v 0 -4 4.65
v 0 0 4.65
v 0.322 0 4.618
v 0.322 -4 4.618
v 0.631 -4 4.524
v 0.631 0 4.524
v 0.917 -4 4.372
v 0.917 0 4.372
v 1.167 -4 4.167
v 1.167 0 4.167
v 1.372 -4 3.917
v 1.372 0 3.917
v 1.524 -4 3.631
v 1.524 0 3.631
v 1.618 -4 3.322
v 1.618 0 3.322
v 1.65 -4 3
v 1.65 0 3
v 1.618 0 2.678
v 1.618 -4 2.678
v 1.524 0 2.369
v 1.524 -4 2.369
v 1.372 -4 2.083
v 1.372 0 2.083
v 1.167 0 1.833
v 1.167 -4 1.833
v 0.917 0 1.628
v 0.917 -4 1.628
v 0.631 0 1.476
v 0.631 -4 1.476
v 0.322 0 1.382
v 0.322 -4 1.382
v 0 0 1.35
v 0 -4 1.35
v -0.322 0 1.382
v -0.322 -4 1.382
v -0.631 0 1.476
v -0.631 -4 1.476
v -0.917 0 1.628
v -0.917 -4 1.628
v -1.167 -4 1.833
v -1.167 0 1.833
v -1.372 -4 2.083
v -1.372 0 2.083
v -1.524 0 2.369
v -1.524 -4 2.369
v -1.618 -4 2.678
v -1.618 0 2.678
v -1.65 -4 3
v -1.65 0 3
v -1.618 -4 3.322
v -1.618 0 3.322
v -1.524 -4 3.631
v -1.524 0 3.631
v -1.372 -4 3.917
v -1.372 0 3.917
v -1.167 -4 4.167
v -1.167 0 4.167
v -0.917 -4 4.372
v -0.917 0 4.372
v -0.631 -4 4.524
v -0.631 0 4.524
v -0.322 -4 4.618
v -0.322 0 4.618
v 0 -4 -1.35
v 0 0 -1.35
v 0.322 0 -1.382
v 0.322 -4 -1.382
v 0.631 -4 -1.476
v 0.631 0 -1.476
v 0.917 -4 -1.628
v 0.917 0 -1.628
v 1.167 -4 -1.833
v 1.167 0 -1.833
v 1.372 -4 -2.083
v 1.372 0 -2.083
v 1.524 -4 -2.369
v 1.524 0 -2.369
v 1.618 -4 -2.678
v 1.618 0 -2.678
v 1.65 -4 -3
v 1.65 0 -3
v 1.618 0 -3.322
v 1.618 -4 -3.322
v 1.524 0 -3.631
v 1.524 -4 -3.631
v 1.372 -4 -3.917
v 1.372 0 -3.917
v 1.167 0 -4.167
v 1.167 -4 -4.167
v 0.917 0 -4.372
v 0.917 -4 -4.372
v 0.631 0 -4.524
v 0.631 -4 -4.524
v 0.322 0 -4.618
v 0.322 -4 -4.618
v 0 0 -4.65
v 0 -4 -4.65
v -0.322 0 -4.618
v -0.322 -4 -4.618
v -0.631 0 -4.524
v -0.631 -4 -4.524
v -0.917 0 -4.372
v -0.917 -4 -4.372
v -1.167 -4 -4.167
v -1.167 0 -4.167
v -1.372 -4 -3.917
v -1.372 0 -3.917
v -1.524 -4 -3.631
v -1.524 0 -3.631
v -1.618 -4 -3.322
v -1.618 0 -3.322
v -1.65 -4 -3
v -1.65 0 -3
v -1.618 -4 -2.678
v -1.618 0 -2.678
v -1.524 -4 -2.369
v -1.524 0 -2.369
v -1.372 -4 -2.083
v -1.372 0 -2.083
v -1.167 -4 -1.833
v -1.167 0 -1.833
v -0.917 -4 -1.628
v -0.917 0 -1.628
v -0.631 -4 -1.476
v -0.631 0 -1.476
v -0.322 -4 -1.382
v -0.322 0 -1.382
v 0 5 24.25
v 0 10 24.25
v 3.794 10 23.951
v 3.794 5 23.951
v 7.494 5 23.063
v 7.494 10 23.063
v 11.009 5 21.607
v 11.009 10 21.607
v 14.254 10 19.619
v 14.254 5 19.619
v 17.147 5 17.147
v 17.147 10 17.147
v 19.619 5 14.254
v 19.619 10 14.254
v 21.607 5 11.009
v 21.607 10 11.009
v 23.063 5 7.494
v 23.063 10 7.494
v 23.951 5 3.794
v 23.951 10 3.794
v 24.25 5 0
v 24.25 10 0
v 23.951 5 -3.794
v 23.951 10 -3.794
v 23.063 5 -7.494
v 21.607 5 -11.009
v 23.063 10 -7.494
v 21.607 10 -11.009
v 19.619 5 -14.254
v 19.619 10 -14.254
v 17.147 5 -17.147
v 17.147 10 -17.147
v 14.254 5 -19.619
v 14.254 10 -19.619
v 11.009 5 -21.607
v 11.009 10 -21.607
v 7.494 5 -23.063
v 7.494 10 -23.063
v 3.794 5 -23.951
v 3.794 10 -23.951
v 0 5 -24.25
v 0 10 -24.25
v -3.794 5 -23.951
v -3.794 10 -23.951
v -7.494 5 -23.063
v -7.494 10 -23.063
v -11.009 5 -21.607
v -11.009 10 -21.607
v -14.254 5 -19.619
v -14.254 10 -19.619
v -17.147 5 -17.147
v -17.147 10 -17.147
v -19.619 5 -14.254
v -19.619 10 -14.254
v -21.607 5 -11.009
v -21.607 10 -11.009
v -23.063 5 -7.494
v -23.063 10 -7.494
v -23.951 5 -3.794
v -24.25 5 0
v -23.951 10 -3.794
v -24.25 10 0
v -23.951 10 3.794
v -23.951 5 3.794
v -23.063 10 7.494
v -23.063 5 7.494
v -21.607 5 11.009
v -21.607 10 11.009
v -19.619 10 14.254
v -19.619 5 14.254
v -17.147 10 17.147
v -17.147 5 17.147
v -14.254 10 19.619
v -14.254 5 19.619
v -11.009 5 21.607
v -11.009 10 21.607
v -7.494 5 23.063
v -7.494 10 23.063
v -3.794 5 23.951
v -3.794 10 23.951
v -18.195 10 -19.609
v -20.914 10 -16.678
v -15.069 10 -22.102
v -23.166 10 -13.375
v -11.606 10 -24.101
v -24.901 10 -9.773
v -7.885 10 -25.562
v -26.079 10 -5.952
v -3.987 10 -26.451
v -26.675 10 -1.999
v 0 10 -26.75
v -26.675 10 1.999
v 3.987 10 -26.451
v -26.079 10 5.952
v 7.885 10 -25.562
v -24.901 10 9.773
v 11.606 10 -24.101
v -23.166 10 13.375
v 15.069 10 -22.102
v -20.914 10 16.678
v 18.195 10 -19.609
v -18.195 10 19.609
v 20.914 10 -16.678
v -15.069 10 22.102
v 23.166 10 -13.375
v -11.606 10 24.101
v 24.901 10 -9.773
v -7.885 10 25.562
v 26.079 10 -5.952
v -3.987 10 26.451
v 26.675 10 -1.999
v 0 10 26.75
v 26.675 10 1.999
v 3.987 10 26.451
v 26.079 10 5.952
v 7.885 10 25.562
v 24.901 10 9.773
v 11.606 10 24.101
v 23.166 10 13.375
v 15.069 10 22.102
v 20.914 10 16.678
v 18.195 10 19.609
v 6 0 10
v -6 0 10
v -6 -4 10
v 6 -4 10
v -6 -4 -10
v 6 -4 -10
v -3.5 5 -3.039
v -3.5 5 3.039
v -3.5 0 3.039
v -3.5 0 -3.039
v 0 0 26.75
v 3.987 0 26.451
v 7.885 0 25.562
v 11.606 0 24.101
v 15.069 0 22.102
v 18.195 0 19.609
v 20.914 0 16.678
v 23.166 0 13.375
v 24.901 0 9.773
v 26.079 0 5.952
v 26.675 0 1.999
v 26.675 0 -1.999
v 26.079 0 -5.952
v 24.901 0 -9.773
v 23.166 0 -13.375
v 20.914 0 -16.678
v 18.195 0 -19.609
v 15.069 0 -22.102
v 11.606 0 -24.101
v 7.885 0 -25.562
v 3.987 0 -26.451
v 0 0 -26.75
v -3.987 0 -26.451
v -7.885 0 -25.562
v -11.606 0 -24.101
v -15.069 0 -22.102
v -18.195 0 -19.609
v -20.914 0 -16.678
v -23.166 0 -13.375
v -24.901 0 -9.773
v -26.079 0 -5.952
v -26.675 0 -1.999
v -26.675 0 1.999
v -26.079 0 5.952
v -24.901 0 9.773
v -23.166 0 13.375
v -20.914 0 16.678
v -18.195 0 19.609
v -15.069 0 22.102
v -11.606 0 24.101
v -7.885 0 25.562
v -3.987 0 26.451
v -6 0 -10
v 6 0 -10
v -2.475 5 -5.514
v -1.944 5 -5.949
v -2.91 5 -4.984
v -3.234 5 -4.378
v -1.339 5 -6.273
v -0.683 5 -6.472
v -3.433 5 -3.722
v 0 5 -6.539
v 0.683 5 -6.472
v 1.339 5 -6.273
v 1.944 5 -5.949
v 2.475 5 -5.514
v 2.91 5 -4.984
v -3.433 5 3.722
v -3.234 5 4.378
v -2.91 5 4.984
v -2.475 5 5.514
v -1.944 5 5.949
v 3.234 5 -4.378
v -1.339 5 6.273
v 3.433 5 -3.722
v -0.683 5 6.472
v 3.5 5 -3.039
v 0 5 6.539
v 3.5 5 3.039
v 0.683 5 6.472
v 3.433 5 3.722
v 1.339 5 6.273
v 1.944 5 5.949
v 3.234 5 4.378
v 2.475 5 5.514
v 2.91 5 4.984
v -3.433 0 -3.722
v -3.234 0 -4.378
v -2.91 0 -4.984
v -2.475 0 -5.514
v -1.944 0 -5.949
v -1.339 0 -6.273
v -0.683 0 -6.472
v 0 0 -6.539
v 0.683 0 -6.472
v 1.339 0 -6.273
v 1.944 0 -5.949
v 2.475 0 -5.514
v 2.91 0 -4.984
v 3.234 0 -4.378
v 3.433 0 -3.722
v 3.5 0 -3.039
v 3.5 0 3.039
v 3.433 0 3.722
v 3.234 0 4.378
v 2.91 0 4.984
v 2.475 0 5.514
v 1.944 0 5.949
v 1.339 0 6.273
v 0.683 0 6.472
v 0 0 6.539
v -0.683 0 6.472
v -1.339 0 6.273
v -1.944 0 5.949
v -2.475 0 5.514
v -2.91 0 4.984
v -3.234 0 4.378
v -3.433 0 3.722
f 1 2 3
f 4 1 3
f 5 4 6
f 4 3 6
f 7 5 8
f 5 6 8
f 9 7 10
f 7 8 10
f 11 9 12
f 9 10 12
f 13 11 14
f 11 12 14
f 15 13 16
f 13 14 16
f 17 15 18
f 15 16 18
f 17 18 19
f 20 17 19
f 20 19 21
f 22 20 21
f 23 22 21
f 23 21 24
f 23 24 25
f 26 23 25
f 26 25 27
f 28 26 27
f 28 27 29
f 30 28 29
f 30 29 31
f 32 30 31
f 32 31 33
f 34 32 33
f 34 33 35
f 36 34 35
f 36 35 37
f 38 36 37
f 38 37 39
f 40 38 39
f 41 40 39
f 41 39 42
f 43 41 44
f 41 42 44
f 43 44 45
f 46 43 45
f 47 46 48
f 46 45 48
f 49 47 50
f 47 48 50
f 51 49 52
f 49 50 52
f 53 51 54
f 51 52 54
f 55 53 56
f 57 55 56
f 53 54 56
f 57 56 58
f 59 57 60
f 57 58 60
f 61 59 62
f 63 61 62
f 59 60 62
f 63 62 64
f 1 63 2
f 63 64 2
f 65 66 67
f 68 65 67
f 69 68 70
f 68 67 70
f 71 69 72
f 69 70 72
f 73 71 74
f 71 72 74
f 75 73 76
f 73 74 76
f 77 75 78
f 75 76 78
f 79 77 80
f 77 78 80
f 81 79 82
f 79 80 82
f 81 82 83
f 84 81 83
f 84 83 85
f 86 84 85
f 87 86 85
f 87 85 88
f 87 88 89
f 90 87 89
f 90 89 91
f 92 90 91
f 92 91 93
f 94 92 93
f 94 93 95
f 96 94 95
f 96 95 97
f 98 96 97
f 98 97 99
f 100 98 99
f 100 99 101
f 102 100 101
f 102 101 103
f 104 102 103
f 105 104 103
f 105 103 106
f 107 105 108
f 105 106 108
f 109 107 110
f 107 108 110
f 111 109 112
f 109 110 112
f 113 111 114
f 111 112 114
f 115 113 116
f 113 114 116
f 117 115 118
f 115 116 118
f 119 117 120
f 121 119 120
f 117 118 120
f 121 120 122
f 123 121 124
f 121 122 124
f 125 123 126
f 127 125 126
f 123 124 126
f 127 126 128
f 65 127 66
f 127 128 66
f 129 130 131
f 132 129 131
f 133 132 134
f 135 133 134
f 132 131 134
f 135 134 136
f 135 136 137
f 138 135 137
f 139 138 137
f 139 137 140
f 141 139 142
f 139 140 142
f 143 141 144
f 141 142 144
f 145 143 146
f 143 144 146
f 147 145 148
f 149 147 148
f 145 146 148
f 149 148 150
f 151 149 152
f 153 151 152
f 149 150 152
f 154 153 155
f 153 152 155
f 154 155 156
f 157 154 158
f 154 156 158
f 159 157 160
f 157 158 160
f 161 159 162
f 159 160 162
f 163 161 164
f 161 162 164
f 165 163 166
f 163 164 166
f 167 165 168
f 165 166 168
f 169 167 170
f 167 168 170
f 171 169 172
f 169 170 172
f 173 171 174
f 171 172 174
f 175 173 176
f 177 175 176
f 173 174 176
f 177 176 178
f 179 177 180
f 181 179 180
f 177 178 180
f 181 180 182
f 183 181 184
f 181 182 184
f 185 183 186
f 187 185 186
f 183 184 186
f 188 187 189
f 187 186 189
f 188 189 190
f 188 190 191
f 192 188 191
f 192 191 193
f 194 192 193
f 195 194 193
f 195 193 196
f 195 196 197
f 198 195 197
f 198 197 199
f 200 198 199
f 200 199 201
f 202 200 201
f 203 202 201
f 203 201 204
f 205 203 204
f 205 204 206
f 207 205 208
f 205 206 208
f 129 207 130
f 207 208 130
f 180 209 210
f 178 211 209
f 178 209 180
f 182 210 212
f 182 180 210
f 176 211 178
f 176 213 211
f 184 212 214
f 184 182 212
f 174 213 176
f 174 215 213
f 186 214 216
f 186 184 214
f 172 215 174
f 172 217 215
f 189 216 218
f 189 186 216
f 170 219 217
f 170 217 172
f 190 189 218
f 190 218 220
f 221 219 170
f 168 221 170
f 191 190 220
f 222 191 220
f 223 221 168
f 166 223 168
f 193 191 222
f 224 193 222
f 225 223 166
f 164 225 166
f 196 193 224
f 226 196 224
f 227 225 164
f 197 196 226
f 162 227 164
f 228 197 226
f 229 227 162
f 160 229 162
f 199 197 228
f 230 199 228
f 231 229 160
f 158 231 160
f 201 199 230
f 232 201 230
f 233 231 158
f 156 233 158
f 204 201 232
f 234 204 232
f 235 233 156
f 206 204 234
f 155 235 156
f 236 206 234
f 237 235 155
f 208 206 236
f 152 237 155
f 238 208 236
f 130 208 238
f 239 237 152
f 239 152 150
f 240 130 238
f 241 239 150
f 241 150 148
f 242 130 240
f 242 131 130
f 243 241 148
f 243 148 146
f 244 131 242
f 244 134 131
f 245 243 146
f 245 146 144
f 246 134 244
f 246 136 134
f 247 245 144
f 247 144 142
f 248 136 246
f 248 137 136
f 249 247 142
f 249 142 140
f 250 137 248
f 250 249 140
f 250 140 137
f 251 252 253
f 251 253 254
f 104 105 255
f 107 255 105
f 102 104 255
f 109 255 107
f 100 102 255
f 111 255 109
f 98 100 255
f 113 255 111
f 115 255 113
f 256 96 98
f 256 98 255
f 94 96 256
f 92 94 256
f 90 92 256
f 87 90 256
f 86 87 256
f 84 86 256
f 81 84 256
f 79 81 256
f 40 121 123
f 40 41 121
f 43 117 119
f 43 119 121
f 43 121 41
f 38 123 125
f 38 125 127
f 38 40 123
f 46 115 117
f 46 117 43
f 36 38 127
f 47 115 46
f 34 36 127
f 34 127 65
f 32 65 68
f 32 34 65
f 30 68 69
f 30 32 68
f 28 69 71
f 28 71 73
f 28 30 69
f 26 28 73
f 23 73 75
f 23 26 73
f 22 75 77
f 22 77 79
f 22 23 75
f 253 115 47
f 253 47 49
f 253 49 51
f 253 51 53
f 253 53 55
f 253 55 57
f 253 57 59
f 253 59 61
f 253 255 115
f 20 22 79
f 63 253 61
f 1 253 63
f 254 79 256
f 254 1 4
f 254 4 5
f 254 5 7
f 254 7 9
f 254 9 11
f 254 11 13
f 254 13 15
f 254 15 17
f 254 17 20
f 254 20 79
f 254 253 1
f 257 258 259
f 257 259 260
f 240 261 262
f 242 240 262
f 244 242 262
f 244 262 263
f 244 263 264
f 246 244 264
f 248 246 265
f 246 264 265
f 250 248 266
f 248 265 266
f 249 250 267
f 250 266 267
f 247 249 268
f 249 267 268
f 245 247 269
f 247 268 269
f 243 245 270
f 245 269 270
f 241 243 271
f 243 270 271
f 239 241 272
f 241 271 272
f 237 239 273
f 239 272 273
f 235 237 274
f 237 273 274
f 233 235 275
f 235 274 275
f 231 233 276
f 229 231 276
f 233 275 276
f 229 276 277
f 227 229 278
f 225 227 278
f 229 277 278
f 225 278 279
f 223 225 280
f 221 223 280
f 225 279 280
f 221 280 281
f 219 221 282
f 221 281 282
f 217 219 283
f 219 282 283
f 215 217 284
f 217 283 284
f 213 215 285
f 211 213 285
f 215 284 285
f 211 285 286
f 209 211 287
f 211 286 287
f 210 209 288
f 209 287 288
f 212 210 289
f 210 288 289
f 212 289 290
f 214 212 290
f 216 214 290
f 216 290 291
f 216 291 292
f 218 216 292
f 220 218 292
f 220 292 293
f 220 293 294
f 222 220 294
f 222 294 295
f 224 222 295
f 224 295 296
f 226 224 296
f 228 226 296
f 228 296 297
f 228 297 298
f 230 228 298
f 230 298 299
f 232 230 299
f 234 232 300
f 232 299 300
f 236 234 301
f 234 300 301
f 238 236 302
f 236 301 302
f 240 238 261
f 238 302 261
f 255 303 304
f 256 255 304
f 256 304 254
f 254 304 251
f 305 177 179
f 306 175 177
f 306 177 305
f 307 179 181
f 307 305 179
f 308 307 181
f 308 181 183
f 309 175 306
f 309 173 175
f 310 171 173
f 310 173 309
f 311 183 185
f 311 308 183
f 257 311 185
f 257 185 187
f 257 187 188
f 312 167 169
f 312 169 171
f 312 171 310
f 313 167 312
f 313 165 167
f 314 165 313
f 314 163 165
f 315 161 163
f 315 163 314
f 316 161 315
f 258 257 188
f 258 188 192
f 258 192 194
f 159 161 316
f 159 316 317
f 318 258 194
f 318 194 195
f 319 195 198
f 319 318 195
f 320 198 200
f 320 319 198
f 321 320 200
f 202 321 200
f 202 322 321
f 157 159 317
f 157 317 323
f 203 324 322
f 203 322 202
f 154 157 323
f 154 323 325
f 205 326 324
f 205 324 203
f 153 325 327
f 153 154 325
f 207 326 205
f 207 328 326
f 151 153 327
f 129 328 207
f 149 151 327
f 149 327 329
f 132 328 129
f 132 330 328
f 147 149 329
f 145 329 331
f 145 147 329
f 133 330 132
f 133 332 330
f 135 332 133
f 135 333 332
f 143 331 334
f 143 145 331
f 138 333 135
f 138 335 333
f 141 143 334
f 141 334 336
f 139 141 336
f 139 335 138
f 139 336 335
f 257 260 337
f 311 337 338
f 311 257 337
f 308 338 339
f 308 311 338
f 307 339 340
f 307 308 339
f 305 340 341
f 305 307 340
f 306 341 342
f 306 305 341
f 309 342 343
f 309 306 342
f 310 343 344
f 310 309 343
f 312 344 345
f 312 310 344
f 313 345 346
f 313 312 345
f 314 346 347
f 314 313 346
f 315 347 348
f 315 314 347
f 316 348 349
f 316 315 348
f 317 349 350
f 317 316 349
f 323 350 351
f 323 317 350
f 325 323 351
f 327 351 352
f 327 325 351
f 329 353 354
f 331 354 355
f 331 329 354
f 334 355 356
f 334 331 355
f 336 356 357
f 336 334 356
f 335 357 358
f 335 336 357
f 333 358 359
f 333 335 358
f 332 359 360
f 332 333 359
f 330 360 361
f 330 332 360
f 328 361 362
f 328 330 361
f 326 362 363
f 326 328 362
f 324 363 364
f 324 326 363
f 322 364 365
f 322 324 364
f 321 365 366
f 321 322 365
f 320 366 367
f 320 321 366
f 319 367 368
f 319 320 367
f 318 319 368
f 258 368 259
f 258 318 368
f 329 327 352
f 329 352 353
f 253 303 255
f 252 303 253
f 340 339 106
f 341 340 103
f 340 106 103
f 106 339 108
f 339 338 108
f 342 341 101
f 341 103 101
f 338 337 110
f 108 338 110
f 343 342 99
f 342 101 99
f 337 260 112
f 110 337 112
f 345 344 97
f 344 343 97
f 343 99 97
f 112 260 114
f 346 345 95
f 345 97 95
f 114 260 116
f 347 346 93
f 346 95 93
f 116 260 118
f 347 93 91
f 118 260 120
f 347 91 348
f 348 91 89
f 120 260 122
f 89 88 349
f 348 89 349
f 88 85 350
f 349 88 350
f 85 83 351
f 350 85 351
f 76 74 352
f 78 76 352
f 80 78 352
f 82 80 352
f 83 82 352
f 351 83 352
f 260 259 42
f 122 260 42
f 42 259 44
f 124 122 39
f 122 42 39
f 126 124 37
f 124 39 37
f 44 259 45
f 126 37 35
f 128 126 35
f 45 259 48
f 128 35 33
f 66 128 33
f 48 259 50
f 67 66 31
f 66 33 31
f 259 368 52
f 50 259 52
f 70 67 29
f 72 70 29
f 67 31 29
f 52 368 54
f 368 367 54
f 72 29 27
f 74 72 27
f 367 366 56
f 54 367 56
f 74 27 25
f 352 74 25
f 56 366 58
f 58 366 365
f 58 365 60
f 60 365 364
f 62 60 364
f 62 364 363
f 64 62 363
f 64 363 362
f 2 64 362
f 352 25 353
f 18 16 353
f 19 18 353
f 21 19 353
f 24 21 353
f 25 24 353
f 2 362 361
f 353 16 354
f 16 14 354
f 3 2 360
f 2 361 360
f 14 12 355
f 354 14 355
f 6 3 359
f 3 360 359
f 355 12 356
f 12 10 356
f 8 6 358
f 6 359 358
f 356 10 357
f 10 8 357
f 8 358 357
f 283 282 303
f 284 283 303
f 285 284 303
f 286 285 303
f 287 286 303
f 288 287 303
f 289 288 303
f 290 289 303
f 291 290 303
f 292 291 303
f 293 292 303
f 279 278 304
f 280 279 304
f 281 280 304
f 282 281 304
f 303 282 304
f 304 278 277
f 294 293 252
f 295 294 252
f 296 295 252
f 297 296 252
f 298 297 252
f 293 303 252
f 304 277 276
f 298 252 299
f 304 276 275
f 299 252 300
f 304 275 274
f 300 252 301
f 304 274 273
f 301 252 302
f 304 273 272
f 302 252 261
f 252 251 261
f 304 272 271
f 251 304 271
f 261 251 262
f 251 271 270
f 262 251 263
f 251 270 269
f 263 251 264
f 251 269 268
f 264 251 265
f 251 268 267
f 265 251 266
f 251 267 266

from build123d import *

# Parameters (mm, degrees)
SKETCH1_R           = 26.75
BOSS_EXTRUDE1_DEPTH = 10
SKETCH2_R           = 24.25
CUT_EXTRUDE3_DEPTH  = 5
CUT_EXTRUDE5_DEPTH  = 6
SKETCH8_W           = 12
SKETCH8_H           = 20
BOSS_EXTRUDE2_DEPTH = 4
SKETCH9_R           = 1.65
CUT_EXTRUDE6_DEPTH  = 15
SKETCH9_3_R         = 1.65
CUT_EXTRUDE7_DEPTH  = 15


with BuildPart() as part:
    # Sketch1 → Boss-Extrude1 (new body)
    with BuildSketch(Plane(origin=(0, 0, 0), x_dir=(1, 0, 0), z_dir=(0, 1, 0))):
        Circle(SKETCH1_R)
    extrude(amount=BOSS_EXTRUDE1_DEPTH)

    # Sketch2 → Cut-Extrude3 (cut)
    with BuildSketch(Plane(origin=(0, 10, 0), x_dir=(1, 0, 0), z_dir=(0, 1, 0))):
        Circle(SKETCH2_R)
    extrude(amount=-CUT_EXTRUDE3_DEPTH, mode=Mode.SUBTRACT)

    # Sketch3 → Cut-Extrude5 (cut)
    with BuildSketch(Plane(origin=(0, 5, 0), x_dir=(1, 0, 0), z_dir=(0, 1, 0))):
        with BuildLine():
            Line((3.5, 3.039080618), (3.5, -3.039080618))
            ThreePointArc((3.5, -3.039080618), (0, -6.539080618), (-3.5, -3.039080618))
            Line((-3.5, -3.039080618), (-3.5, 3.039080618))
            ThreePointArc((-3.5, 3.039080618), (0, 6.539080618), (3.5, 3.039080618))
        make_face()
    extrude(amount=-CUT_EXTRUDE5_DEPTH, mode=Mode.SUBTRACT)

    # Sketch8 → Boss-Extrude2 (add)
    with BuildSketch(Plane.XZ):
        Rectangle(SKETCH8_W, SKETCH8_H)
    extrude(amount=BOSS_EXTRUDE2_DEPTH)

    # Sketch9 → Cut-Extrude6 (cut)
    with BuildSketch(Plane(origin=(0, 0, 0), x_dir=(1, 0, 0), z_dir=(0, 1, 0))):
        with Locations((0, 3)):
            Circle(SKETCH9_R)
    extrude(amount=-CUT_EXTRUDE6_DEPTH, mode=Mode.SUBTRACT)

    # Sketch9<3> → Cut-Extrude7 (cut)
    with BuildSketch(Plane(origin=(0, 0, 0), x_dir=(1, 0, 0), z_dir=(0, 1, 0))):
        with Locations((0, 3)):
            Circle(SKETCH9_3_R)
        with Locations((0, -3)):
            Circle(SKETCH9_3_R)
    extrude(amount=-CUT_EXTRUDE7_DEPTH, mode=Mode.SUBTRACT)


solid = part.part
